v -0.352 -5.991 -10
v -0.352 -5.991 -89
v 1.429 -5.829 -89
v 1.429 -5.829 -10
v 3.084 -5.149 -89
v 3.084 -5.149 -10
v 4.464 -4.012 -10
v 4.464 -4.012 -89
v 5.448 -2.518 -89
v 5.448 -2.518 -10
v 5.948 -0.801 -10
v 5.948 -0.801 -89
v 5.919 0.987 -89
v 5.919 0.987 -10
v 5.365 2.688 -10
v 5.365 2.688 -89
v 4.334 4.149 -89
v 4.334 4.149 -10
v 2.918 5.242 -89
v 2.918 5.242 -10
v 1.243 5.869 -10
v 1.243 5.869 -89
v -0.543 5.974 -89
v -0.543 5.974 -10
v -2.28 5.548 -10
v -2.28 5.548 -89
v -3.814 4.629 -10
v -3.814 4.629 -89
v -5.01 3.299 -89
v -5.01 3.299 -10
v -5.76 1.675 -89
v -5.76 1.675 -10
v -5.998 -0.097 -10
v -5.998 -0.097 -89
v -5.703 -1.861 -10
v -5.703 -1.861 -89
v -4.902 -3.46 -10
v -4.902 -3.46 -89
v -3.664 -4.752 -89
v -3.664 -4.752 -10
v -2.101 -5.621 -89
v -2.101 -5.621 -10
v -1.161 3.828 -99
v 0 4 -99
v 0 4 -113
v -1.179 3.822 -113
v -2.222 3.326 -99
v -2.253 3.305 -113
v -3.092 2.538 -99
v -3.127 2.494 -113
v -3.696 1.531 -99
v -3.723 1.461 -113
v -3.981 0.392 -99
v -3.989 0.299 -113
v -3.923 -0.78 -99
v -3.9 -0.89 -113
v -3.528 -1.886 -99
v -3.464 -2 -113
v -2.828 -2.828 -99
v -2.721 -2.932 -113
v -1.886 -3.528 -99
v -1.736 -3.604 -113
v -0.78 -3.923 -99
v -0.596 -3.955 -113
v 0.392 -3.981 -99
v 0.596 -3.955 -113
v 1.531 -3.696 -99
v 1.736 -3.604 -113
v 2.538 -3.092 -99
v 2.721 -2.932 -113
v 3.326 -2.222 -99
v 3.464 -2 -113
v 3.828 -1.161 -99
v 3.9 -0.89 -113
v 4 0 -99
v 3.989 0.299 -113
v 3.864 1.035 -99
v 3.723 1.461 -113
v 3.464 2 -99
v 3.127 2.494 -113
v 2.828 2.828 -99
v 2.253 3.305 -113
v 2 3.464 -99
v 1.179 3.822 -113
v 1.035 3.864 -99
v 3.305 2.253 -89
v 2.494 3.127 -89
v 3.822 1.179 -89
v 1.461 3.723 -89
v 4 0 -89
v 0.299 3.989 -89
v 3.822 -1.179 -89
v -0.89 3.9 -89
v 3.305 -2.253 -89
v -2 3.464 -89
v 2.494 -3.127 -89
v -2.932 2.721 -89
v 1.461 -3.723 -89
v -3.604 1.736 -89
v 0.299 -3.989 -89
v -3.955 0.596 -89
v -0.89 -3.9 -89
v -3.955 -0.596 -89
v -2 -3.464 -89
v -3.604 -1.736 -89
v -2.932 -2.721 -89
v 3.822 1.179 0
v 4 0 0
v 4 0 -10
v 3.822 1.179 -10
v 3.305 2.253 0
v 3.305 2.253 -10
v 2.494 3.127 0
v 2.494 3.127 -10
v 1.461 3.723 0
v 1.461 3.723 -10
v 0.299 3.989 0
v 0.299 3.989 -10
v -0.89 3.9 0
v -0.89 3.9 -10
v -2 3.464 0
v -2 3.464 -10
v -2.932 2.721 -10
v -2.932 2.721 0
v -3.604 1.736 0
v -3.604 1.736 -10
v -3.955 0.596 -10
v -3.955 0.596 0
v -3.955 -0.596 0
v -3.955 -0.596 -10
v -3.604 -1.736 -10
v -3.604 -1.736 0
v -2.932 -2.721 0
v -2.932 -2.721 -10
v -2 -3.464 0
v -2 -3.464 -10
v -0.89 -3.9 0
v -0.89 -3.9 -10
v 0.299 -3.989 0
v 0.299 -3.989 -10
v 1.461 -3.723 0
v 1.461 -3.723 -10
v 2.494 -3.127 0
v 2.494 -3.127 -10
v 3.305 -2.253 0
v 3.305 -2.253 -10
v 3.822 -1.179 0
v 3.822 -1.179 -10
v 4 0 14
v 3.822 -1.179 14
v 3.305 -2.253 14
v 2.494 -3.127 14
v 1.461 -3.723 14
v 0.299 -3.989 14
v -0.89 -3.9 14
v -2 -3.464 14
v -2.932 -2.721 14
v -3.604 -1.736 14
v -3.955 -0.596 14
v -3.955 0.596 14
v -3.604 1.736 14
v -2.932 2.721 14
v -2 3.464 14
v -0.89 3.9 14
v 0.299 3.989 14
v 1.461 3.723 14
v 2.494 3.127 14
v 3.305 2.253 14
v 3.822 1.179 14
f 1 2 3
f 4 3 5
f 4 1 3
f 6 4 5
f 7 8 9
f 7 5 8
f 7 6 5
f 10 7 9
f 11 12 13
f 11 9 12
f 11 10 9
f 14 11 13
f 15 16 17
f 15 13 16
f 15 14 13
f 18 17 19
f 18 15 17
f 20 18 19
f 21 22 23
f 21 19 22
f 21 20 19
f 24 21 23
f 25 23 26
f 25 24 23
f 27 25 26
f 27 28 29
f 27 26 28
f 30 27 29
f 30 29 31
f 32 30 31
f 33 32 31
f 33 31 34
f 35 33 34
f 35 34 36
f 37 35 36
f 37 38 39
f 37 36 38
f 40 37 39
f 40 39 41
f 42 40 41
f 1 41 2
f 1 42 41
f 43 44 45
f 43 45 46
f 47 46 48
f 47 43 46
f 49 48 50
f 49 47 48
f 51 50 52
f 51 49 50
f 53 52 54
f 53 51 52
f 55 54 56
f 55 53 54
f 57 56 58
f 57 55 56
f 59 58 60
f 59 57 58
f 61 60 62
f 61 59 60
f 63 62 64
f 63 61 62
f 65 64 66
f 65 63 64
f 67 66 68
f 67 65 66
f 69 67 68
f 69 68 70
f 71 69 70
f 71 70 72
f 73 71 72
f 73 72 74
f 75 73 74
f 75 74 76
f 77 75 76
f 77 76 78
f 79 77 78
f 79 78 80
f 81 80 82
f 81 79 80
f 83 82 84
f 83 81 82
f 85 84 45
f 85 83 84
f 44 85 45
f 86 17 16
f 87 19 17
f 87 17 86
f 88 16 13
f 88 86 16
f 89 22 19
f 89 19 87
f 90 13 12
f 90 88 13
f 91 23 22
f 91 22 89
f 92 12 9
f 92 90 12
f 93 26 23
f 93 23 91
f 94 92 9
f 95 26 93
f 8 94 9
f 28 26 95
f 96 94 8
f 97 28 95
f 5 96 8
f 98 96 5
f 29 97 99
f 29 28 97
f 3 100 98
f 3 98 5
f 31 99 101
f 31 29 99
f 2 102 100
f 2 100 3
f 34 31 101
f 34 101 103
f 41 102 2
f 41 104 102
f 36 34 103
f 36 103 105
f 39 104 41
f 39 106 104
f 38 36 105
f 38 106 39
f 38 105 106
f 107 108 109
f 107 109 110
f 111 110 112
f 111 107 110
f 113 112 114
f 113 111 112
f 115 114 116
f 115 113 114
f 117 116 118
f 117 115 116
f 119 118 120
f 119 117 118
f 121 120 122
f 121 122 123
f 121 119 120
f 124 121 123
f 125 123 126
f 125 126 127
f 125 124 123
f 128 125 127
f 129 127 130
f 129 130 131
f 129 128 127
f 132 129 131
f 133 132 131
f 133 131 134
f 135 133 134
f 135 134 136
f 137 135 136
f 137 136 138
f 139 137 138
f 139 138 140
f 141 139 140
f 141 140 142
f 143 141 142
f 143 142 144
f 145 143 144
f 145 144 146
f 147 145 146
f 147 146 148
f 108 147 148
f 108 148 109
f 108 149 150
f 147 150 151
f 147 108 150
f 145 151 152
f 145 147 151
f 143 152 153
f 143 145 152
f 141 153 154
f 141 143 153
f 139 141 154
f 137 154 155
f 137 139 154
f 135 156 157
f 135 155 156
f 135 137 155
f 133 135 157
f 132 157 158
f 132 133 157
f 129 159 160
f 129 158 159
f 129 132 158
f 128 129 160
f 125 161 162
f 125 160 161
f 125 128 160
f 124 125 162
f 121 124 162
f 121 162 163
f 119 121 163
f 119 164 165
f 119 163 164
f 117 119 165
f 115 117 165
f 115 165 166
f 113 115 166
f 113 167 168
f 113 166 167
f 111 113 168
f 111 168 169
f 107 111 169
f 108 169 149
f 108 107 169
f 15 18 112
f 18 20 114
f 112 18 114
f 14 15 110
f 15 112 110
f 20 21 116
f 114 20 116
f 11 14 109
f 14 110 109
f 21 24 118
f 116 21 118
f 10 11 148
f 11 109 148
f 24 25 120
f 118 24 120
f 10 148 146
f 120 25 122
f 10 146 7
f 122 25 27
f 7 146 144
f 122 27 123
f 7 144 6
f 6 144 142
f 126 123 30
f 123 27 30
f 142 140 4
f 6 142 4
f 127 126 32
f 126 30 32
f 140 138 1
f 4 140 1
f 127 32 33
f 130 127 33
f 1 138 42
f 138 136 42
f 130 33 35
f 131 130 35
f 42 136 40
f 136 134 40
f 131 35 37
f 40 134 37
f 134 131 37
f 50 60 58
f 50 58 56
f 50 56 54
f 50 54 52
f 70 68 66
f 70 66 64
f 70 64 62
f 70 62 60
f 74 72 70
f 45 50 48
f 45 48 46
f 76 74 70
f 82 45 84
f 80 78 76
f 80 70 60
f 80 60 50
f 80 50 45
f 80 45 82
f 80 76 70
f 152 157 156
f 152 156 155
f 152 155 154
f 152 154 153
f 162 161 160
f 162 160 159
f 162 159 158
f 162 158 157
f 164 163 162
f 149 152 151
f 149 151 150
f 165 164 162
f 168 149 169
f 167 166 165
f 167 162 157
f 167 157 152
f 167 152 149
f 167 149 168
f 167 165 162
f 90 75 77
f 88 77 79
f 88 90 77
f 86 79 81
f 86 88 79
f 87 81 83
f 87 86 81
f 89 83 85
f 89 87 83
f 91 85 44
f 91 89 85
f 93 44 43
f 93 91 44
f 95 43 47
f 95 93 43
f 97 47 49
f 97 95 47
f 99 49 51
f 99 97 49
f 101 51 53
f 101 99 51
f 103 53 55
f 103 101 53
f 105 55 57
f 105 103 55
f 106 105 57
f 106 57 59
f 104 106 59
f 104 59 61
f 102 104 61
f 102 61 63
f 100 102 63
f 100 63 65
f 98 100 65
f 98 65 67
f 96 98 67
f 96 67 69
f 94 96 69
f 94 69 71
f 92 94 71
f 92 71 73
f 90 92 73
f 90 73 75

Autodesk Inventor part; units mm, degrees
ref_plane "YZ Plane" through (0, 0, 0) normal (1, 0, 0) x (0, 1, 0)
ref_plane "XZ Plane" through (0, 0, 0) normal (0, 1, 0) x (-1, 0, 0)
sketch "Base" plane through (0, 0, 0) normal (0, 0, 1) x (1, 0, 0)
  line L0 (-3.5, 1.9365) -> (-3.5, -1.9365)
  line L1 (0, -5.6) -> (0, 5.6) construction
  circle A0 centre (0, 0) radius 4
  point P0 (-3.5, 0)
  dimension "d9" = 8
  dimension "d11" = 3.5
ref_plane "BasePlane" through (-230.8476, -175.3438, -99) normal (0, 0, -1) x (0, 1, 0)
extrude "BaseFeature" add sketch "Base" against normal up to surface (99 mm away)
sketch "Sketch4" plane through (0, 0, 0) normal (0, 0, 1) x (1, 0, 0)
  circle A0 centre (0, 0) radius 4 projected
extrude "Extrusion4" add sketch "Sketch4" along normal blind 14
sketch "Sketch5" plane through (0, 0, -99) normal (0, 0, -1) x (0, 1, 0)
  circle A0 centre (0, 0) radius 4 projected
  point P0 (0, 0)
extrude "Extrusion5" add sketch "Sketch5" along normal blind 14
ref_plane "StartPlane" through (-70.1743, -50.75, -10) normal (0, 0, -1) x (-0.0588, -0.9983, 0)
ref_plane "EndPlane" through (2.103, 3.913, -89) normal (0, 0, 1) x (-0.0671, 0.9977, 0)
sketch "Sketch6" plane through (-70.1743, -50.75, -10) normal (0, 0, -1) x (-0.0588, -0.9983, 0)
  circle A0 centre (-54.7868, -67.0701) radius 4.165 projected
  circle A1 centre (-54.7868, -67.0701) radius 6
  point P0 (-54.7868, -67.0701)
  dimension "d16" = 12
extrude "Extrusion6" add sketch "Sketch6" along normal up to surface (79 mm away) contours A0 | A1
properties part number "LegKneeShaft"
